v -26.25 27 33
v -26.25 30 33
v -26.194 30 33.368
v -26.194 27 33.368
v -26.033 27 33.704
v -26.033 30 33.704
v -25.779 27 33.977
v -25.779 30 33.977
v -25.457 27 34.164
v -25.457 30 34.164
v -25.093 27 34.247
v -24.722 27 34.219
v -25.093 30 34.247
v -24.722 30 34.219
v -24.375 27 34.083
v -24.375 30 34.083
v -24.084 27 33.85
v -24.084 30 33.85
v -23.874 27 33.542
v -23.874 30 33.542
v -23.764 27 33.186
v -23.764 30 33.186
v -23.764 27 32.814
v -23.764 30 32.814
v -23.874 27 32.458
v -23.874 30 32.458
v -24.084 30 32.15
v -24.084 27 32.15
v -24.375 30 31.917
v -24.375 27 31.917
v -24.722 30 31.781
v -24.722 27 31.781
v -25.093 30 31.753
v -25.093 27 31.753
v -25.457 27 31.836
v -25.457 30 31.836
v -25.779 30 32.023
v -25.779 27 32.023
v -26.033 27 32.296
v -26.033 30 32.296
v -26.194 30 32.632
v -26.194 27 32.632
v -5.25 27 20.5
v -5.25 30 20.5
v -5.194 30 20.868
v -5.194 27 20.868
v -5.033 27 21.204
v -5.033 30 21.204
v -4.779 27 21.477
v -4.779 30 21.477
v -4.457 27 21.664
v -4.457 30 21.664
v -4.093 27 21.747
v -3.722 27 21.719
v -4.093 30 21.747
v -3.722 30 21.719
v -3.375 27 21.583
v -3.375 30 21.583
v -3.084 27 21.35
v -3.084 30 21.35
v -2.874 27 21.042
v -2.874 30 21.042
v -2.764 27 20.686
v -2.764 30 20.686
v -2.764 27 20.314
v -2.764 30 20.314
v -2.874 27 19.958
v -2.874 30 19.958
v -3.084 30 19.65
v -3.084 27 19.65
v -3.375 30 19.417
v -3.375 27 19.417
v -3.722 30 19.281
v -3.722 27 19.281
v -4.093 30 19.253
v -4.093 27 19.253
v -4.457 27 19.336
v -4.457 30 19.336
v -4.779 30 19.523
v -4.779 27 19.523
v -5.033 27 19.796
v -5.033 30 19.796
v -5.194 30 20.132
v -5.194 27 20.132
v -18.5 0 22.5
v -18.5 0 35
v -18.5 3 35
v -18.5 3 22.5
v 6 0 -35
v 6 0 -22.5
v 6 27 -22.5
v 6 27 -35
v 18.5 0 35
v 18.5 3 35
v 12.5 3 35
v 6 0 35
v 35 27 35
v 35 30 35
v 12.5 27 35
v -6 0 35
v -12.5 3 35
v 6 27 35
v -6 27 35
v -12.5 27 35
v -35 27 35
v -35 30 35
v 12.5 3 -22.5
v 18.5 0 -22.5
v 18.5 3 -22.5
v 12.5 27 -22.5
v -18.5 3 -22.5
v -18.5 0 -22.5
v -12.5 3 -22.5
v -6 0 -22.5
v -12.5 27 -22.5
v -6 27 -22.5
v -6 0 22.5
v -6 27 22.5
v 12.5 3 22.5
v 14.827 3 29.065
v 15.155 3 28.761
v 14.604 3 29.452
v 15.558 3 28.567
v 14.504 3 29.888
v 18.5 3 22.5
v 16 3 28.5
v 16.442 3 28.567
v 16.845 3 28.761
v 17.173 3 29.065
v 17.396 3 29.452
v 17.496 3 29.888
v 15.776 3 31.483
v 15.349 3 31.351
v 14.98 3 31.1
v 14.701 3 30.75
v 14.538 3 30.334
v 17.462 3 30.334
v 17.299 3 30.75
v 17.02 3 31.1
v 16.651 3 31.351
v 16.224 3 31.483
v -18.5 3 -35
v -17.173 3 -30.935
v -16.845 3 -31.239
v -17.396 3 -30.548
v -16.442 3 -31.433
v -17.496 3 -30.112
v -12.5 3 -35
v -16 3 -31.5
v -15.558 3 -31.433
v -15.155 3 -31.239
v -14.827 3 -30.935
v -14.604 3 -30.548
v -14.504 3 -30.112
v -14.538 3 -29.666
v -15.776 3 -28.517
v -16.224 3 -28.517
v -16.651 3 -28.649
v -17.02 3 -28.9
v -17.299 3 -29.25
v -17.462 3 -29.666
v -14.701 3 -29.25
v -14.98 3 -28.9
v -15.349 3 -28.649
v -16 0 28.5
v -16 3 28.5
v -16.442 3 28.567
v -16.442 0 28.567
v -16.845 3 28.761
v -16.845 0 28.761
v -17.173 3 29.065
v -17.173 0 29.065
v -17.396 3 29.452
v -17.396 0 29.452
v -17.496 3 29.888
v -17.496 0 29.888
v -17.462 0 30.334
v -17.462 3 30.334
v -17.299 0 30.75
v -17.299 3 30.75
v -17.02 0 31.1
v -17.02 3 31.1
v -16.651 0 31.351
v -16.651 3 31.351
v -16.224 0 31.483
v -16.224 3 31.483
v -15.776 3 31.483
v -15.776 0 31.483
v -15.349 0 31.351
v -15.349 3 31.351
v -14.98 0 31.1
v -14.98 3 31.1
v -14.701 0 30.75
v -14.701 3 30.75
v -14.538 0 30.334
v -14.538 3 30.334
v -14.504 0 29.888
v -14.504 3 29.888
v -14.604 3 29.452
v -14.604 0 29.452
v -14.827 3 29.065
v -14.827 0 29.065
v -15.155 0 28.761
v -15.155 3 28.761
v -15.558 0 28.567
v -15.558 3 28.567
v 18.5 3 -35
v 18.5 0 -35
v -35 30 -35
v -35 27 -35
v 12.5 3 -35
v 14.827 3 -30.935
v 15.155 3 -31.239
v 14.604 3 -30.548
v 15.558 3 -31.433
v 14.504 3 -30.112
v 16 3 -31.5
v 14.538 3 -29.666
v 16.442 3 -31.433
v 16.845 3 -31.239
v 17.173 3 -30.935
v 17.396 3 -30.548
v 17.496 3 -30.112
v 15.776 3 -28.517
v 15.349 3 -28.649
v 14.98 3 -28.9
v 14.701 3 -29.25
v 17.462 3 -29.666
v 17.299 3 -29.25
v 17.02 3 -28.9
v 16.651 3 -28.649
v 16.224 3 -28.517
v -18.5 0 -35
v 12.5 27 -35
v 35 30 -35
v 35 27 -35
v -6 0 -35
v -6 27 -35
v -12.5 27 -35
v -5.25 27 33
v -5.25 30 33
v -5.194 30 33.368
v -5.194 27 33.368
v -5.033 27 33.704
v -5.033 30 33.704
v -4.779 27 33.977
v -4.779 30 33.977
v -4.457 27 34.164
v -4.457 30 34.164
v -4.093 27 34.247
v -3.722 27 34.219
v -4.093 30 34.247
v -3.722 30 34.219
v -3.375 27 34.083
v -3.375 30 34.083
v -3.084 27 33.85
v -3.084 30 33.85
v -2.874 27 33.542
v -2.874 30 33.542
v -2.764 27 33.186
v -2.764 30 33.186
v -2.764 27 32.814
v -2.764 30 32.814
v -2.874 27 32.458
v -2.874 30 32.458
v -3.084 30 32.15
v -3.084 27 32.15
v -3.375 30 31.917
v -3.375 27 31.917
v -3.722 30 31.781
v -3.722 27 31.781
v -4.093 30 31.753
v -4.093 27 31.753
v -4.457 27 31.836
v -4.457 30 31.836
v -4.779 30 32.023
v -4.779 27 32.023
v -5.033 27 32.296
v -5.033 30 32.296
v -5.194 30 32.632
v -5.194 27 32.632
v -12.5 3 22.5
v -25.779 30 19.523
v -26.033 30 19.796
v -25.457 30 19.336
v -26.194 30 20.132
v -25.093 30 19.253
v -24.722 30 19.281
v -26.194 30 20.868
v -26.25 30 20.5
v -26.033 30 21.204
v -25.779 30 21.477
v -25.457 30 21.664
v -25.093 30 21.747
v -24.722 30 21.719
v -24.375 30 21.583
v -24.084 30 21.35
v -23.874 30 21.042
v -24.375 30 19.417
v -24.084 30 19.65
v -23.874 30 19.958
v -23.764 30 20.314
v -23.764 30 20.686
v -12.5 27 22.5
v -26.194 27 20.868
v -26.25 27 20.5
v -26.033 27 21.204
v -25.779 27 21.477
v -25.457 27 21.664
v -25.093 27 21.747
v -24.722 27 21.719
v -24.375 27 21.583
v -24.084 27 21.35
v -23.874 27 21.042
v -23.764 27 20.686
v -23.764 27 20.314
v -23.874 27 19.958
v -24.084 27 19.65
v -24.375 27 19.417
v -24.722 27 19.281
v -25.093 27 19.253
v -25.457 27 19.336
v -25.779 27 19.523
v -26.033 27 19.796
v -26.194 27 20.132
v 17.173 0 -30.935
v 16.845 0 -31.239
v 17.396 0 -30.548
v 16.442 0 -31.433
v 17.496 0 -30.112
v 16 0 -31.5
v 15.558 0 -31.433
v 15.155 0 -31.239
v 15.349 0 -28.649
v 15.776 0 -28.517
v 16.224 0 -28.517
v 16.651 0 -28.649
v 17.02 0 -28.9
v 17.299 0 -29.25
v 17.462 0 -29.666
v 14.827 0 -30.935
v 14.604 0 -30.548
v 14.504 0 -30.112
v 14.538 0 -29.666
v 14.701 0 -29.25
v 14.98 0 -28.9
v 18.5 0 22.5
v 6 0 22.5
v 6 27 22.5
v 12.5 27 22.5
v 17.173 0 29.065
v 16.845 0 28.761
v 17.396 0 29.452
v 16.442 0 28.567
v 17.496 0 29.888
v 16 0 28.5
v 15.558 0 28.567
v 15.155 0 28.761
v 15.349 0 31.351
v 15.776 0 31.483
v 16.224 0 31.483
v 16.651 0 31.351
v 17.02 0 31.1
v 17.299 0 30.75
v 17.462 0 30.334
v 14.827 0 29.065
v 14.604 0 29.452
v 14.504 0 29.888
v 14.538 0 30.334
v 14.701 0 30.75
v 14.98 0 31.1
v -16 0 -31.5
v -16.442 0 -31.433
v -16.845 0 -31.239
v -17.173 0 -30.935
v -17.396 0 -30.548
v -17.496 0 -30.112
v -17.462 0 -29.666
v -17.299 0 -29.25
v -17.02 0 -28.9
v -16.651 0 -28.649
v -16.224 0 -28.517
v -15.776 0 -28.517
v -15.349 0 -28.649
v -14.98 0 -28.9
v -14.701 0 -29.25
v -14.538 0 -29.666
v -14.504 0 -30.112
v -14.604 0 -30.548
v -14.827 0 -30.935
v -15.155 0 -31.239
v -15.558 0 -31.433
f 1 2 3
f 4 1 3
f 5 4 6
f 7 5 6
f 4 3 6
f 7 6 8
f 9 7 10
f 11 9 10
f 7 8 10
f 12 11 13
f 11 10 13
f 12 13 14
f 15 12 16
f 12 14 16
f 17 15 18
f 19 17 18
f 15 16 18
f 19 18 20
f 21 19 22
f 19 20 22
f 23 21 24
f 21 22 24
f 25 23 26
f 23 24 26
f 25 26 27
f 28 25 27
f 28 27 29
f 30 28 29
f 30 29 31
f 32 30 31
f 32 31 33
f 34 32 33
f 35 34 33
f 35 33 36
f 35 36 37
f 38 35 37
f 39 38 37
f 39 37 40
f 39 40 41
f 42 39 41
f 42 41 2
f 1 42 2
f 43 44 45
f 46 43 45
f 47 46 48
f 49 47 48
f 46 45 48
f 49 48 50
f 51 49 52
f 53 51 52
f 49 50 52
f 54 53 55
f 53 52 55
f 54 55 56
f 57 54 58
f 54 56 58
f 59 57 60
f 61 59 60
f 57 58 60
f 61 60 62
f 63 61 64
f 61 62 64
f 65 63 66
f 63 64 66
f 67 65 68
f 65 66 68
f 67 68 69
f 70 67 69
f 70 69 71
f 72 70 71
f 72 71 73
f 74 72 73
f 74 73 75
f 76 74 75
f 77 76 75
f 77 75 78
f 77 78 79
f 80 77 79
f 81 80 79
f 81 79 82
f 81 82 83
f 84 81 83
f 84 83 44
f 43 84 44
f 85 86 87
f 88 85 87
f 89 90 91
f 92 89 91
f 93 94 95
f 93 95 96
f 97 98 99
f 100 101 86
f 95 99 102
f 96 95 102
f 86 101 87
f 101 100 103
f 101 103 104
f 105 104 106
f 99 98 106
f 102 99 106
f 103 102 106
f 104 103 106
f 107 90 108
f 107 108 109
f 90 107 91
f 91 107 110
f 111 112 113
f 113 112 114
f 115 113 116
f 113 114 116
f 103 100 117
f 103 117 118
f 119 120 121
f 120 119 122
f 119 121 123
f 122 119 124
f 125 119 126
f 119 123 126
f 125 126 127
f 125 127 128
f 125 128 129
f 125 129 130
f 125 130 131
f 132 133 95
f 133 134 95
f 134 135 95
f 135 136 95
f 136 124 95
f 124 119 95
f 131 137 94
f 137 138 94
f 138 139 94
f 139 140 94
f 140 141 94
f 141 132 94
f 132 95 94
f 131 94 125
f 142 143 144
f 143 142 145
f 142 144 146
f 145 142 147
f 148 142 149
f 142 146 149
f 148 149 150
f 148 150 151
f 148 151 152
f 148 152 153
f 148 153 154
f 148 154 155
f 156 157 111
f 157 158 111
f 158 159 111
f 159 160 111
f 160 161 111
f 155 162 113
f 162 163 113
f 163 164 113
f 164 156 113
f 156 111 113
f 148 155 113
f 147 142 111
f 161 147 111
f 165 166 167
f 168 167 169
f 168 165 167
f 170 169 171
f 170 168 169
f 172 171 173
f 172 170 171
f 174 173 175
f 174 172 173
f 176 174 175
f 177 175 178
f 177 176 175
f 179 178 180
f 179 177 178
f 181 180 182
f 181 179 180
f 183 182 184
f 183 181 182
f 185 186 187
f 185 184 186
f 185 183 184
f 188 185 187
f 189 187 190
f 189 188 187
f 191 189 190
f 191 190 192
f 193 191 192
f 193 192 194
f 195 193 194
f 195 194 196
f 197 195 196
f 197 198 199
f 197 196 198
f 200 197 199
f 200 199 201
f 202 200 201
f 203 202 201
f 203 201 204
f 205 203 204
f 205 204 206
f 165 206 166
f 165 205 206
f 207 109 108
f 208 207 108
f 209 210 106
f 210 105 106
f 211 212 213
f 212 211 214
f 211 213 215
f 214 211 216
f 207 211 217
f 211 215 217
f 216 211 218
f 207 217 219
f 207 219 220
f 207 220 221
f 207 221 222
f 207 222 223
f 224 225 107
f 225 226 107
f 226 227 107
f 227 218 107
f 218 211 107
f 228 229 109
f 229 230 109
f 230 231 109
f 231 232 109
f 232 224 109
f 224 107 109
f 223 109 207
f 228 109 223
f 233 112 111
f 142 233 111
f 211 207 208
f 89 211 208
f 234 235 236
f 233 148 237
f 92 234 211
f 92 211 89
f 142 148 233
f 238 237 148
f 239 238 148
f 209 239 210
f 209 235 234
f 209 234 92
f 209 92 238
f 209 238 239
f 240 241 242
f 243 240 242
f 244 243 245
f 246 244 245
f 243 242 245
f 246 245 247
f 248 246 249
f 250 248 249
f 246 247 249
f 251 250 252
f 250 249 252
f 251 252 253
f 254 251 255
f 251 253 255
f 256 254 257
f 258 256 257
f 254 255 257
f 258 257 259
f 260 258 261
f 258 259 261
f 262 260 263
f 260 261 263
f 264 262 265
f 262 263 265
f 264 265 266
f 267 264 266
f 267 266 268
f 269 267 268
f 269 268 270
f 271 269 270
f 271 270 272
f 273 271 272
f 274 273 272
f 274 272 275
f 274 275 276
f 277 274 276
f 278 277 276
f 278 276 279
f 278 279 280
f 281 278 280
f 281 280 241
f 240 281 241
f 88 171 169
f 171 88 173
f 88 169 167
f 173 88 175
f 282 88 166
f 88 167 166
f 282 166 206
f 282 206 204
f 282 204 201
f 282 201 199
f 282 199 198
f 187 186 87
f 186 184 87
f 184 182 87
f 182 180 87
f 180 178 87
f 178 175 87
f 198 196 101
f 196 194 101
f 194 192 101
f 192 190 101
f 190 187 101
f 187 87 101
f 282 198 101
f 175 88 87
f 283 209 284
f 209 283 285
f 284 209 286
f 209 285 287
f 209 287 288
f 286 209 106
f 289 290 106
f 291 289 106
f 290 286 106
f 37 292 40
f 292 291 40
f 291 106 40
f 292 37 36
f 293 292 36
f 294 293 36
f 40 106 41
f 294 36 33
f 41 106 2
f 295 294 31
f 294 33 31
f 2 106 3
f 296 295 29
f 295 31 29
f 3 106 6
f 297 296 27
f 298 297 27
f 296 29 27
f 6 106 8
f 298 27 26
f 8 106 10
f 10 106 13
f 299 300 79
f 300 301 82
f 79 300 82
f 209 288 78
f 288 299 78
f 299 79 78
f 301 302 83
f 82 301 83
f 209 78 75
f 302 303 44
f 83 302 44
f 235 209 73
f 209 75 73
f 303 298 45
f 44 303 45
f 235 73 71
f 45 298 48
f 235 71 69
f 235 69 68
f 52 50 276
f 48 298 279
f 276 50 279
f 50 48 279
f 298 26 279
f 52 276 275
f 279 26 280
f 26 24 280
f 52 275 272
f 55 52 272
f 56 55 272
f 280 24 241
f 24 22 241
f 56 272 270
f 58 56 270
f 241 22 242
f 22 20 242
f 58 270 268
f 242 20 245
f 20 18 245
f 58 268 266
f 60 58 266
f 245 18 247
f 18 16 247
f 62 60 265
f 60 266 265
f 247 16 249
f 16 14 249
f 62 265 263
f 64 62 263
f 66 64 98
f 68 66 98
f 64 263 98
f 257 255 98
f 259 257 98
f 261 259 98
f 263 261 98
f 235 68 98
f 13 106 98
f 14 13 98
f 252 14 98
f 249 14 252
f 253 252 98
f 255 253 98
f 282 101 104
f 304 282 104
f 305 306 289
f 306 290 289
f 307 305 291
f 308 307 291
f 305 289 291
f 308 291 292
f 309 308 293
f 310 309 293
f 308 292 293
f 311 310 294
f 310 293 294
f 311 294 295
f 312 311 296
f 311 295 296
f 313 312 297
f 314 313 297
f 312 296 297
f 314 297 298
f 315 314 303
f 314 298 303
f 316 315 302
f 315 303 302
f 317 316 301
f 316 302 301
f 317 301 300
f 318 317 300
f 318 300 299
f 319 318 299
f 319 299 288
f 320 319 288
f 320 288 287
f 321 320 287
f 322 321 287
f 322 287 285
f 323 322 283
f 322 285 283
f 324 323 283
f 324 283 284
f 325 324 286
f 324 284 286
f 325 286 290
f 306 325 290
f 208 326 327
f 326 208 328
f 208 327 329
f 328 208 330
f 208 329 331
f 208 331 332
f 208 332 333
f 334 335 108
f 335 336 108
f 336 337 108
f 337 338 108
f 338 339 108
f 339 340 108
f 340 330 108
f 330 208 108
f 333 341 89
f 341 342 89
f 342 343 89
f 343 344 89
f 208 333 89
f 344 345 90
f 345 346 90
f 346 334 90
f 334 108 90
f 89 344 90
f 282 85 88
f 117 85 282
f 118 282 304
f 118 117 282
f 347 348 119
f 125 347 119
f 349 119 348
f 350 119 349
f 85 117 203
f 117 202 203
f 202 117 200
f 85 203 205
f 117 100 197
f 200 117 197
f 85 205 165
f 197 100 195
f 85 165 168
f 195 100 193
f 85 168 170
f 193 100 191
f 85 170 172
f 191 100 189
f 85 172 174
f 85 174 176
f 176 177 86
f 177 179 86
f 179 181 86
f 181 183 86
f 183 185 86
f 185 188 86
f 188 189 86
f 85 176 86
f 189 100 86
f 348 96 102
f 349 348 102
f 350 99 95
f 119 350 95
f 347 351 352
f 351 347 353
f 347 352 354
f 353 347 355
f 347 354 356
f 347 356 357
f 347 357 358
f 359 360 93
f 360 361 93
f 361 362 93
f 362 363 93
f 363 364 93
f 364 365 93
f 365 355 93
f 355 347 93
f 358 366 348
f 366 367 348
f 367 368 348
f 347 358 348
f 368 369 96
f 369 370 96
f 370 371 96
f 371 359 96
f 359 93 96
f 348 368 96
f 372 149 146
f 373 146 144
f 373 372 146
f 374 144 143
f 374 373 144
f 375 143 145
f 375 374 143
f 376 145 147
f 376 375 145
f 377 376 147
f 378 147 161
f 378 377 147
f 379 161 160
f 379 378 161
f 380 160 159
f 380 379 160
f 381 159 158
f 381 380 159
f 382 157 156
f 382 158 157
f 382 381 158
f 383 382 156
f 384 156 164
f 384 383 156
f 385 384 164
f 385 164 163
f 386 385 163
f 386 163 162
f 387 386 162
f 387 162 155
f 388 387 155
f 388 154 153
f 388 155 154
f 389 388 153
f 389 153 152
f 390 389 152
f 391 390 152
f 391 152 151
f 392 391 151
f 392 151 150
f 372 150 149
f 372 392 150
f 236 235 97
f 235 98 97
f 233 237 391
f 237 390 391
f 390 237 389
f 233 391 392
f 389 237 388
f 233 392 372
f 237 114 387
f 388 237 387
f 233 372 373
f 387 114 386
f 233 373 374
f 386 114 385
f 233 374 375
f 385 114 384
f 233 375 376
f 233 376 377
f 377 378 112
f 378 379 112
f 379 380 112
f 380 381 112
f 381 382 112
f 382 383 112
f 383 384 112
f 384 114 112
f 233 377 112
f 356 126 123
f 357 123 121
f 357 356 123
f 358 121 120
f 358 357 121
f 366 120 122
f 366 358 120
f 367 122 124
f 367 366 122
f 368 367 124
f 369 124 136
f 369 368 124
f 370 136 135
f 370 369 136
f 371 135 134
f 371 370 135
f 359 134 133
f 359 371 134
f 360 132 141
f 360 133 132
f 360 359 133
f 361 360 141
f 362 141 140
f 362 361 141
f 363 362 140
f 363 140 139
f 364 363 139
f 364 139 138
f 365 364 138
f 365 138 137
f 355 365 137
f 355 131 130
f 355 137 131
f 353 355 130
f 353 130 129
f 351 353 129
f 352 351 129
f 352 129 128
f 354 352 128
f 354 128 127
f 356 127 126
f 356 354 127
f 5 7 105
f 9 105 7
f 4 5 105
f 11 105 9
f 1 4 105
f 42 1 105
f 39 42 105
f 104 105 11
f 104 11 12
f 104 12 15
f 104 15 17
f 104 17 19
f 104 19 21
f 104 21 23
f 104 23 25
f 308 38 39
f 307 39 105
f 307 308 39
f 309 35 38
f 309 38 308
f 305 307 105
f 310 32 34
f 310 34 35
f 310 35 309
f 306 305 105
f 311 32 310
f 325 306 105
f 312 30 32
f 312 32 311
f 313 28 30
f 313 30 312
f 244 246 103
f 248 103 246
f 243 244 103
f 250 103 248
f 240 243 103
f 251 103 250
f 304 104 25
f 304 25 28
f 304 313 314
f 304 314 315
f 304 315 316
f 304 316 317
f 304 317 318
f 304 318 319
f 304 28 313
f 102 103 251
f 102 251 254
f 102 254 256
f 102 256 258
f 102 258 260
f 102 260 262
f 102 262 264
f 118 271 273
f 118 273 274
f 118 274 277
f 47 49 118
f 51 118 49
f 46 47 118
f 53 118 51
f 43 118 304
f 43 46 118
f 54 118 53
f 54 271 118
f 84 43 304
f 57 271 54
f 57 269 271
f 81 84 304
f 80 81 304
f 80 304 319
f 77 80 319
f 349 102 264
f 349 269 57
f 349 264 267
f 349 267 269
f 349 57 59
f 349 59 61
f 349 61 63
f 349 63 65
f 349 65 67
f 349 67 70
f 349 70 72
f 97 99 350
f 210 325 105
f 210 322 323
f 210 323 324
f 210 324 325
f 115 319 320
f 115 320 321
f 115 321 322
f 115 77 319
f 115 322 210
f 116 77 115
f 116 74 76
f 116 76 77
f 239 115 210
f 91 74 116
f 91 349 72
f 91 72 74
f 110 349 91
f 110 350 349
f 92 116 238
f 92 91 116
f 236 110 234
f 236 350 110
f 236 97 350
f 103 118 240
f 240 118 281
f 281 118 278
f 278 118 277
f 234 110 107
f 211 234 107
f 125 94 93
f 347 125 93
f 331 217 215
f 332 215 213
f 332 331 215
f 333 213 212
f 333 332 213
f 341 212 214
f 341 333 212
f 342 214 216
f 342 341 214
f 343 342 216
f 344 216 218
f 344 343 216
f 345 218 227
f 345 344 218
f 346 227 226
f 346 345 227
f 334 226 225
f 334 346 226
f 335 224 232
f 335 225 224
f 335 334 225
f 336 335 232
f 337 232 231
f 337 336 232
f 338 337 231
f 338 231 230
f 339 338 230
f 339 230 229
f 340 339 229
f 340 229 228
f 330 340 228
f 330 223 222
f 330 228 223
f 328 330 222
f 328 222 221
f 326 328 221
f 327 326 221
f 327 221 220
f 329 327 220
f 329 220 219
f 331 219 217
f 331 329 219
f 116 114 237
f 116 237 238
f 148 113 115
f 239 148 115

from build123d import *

# Parameters (mm, degrees)
EXTRUDE_1_DEPTH     = 35
SKETCH_2_W          = 45
SKETCH_2_H          = 27
CUT_EXTRUDE_1_DEPTH = 35
SKETCH_3_W          = 12
SKETCH_3_H          = 27
CUT_EXTRUDE_2_DEPTH = 40
SKETCH_4_R          = 1.5
CUT_EXTRUDE_3_DEPTH = 19
SKETCH_5_R          = 1.25
CUT_EXTRUDE_4_DEPTH = 5


with BuildPart() as part:
    # 草圖1 → 填料-伸長1 (new, symmetric)
    with BuildSketch(Plane.XY):
        Polygon((-18.5, 0), (-18.5, 3), (-12.5, 3), (-12.5, 27), (-35, 27), (-35, 30), (35, 30), (35, 27), (12.5, 27), (12.5, 3), (18.5, 3), (18.5, 0), align=None)
    extrude(amount=EXTRUDE_1_DEPTH, both=True)

    # 草圖2 → 除料-伸長1 (cut, symmetric)
    with BuildSketch(Plane(origin=(0, 0, 0), x_dir=(0, 0, -1), z_dir=(1, 0, 0))):
        with Locations((0, 13.5)):
            Rectangle(SKETCH_2_W, SKETCH_2_H)
    extrude(amount=CUT_EXTRUDE_1_DEPTH, both=True, mode=Mode.SUBTRACT)

    # 草圖3 → 除料-伸長2 (cut, symmetric)
    with BuildSketch(Plane.XY):
        with Locations((0, 13.5)):
            Rectangle(SKETCH_3_W, SKETCH_3_H)
    extrude(amount=CUT_EXTRUDE_2_DEPTH, both=True, mode=Mode.SUBTRACT)

    # 草圖4 → 除料-伸長3 (cut)
    with BuildSketch(Plane(origin=(0, 0, 0), x_dir=(1, 0, 0), z_dir=(0, 1, 0))):
        with Locations(Location((-16, -30, 0), (0, 0, 90))):
            Circle(SKETCH_4_R)
        with Locations(Location((16, -30, 0), (0, 0, 90))):
            Circle(SKETCH_4_R)
        with Locations(Location((16, 30, 0), (0, 0, 90))):
            Circle(SKETCH_4_R)
        with Locations(Location((-16, 30, 0), (0, 0, 90))):
            Circle(SKETCH_4_R)
    extrude(amount=CUT_EXTRUDE_3_DEPTH, mode=Mode.SUBTRACT)

    # 草圖5 → 除料-伸長4 (cut, symmetric)
    with BuildSketch(Plane(origin=(0, 30, 0), x_dir=(1, 0, 0), z_dir=(0, 1, 0))):
        with Locations(Location((-4, -20.5, 0), (0, 0, 180))):
            Circle(SKETCH_5_R)
        with Locations(Location((-4, -33, 0), (0, 0, 180))):
            Circle(SKETCH_5_R)
        with Locations(Location((-25, -33, 0), (0, 0, 180))):
            Circle(SKETCH_5_R)
        with Locations(Location((-25, -20.5, 0), (0, 0, 180))):
            Circle(SKETCH_5_R)
    extrude(amount=CUT_EXTRUDE_4_DEPTH, both=True, mode=Mode.SUBTRACT)


solid = part.part
